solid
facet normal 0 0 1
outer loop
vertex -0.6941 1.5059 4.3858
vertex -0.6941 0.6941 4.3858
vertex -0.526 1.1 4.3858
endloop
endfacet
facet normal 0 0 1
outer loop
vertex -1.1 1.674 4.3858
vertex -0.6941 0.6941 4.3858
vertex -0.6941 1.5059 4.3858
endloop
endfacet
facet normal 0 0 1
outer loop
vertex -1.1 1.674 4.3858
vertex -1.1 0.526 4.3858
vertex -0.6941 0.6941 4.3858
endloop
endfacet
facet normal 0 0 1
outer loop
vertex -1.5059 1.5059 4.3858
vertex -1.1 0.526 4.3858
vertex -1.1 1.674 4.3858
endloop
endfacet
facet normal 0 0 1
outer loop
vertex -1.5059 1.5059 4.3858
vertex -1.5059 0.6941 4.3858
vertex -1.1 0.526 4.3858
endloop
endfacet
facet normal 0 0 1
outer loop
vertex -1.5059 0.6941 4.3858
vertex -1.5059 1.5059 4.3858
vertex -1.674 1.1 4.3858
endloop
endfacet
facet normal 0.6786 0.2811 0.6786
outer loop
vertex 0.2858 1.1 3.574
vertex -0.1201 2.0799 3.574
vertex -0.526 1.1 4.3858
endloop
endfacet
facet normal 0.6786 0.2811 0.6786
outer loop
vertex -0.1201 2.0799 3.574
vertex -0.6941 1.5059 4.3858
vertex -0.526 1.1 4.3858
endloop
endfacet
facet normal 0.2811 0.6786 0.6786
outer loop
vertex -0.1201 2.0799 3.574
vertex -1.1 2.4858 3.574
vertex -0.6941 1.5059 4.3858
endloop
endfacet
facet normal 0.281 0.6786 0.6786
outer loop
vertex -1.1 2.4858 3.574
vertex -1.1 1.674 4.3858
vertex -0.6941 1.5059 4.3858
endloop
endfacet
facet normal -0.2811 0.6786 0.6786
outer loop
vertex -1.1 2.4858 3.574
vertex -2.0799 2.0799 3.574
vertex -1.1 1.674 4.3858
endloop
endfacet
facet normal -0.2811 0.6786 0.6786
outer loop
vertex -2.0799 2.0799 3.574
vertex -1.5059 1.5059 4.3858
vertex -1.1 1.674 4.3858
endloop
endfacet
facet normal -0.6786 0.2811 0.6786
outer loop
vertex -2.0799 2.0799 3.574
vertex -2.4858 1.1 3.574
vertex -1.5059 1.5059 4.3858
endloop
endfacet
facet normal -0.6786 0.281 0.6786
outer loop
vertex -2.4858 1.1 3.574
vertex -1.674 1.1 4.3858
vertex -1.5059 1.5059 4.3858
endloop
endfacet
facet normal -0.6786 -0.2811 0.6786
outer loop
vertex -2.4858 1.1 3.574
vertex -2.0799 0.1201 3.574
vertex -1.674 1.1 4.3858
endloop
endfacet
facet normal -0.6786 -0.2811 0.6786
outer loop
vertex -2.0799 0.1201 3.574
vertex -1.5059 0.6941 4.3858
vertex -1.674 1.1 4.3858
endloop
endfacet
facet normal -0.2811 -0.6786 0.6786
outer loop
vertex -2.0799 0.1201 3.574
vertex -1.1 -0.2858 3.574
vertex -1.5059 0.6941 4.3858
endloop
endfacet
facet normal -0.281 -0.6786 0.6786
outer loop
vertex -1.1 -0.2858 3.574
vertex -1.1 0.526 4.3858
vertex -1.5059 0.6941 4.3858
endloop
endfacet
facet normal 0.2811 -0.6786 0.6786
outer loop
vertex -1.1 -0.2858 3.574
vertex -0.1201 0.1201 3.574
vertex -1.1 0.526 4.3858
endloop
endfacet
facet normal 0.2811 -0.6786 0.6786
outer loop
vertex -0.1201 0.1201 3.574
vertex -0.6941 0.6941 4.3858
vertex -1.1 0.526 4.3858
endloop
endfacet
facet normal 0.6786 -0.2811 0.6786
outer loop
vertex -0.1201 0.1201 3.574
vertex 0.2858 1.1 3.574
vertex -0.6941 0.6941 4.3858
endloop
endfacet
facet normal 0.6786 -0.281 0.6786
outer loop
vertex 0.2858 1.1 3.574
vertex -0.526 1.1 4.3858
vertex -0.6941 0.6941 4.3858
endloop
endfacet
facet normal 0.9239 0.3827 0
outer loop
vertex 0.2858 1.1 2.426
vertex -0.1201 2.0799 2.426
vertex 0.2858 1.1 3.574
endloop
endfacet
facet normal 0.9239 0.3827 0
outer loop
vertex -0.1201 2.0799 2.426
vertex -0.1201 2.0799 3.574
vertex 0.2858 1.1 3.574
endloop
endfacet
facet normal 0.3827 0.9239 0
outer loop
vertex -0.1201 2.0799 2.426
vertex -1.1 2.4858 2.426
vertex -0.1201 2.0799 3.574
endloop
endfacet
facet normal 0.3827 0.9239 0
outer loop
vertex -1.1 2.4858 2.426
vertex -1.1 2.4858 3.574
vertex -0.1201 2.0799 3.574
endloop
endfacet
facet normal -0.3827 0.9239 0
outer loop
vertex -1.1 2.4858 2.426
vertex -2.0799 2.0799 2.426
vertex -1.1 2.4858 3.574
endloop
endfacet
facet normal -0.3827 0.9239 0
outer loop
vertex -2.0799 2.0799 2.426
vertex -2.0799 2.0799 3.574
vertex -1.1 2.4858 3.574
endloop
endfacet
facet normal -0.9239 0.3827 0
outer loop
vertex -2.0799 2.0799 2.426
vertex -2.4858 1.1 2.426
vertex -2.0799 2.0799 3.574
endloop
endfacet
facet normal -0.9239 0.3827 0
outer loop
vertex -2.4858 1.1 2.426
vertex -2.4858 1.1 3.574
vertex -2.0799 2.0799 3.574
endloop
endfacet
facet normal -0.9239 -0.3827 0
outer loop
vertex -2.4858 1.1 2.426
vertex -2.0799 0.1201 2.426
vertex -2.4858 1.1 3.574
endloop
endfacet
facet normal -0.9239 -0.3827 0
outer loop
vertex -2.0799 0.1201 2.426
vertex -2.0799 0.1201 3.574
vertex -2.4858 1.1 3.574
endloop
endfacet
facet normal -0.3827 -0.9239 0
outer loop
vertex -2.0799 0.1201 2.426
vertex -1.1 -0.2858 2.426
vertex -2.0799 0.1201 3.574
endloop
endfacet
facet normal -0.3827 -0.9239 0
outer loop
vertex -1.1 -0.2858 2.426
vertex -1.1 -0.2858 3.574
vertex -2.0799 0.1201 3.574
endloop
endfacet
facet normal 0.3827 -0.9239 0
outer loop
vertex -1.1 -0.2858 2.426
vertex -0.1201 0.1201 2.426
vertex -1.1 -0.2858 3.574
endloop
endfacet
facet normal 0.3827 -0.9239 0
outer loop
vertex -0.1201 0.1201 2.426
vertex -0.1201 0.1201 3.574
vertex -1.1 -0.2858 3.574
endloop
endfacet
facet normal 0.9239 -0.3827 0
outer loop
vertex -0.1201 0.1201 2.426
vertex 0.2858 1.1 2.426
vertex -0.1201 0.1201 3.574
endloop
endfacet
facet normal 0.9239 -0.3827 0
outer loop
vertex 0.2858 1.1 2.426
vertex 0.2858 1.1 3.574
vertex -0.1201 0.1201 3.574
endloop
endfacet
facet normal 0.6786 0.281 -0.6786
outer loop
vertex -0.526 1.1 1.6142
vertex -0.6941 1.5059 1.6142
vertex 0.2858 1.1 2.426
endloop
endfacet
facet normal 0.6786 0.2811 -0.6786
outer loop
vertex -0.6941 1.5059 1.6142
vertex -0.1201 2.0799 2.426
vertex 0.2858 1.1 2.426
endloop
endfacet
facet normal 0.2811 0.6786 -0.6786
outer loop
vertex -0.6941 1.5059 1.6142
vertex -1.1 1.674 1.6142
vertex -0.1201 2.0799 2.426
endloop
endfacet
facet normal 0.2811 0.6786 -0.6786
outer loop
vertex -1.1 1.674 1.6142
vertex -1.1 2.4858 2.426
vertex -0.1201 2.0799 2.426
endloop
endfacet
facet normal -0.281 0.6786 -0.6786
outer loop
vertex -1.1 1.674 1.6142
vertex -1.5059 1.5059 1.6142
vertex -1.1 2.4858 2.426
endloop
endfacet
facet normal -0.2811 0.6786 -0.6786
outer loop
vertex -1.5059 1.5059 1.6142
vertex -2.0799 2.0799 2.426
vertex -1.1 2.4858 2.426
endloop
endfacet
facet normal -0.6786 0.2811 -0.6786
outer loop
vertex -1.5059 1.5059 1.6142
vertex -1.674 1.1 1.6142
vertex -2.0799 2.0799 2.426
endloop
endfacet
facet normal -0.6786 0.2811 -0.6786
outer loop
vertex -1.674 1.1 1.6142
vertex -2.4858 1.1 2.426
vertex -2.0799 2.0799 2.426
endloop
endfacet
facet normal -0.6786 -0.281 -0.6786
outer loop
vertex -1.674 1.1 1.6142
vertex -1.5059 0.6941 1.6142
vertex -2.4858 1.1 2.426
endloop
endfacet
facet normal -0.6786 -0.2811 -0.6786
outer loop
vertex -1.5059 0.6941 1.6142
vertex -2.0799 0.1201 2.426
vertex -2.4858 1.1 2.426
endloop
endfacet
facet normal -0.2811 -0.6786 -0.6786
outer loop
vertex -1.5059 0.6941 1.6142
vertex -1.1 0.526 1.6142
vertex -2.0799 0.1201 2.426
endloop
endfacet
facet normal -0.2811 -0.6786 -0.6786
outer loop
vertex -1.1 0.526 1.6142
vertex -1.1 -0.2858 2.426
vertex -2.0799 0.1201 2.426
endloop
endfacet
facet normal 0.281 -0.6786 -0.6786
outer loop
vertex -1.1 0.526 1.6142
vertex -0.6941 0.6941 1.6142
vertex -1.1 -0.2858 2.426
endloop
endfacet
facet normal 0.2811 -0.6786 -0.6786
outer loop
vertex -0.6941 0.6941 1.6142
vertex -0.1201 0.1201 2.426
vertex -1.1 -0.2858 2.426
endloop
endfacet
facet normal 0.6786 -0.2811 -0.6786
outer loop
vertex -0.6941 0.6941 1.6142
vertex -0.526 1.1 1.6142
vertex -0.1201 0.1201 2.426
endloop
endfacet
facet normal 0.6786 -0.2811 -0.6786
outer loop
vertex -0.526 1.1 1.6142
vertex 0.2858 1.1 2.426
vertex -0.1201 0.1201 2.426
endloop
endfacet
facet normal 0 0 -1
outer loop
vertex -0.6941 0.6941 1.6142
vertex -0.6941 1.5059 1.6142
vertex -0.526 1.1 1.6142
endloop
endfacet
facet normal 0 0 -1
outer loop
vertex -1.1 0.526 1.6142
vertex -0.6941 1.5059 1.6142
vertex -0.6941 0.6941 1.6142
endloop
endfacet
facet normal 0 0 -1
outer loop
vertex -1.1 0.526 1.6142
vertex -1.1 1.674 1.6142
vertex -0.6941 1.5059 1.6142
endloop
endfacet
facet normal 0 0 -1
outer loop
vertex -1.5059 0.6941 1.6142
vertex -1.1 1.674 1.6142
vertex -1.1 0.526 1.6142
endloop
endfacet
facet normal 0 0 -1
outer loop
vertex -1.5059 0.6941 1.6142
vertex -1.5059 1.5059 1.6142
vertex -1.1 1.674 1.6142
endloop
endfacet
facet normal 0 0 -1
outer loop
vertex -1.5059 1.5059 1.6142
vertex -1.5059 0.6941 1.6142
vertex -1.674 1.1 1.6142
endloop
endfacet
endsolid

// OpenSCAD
use <lib.scad>

hd = 72;
ld = 8;

module baseHD() {
	translate([0,0,0.5], $fn=hd) union() {
		rbox([5.8,5.8,1], 0.05, $fn=8);
		translate([0,-1.55,1.4]) difference() {
			rbox([5.2,2,2], 0.025, $fn=8);
			translate([-2.6,0,0]) rotate([0,90,0]) cyl(0.75,0.75,1);
			translate([2.6,0,0]) rotate([0,90,0]) cyl(0.75,0.75,1);
		}
	}
}

module baseLD() {
	translate([0,0,0.5], $fn=ld) union() {
		box([5.8,5.8,1]);
		translate([0,-1.55,1.4]) difference() {
			box([5.2,2,2]);
			translate([-2.6,0,0]) rotate([0,90,0]) cyl(0.75,0.75,1);
			translate([2.6,0,0]) rotate([0,90,0]) cyl(0.75,0.75,1);
		}
	}
}

module baseVLD() {
	translate([0,0,0.5], $fn=ld) union() {
		box([5.8,5.8,1]);
		translate([0,-1.55,1.4]) difference() {
			box([5.2,2,2]);
		}
	}
}

module stackHD() {
	translate([1.6,1.6,4], $fn=hd) union() {
		difference() {
			cyl(0.5, 0.5, 8.0);
			cyl(0.3, 0.3, 8.1);
		}
		translate([0,0,-2.5]) hull() {
			cyl(1.0, 1.0, 3.0);
			translate([0,0,3]) cyl(0.5, 0.5, 0.8);
		}
		for (i = [1:1:4]) translate([0,0,i-0.1]) difference() {
			cyl(0.6, 0.6, 0.1);
			cyl(0.5, 0.5, 0.15);
		}
	}
}

module stackLD() {
	translate([1.6,1.6,4], $fn=ld) union() {
		difference() {
			cyl(0.5, 0.5, 8.0);
			cyl(0.3, 0.3, 8.1);
		}
		translate([0,0,-2.5]) hull() {
			cyl(1.0, 1.0, 3.0);
			translate([0,0,3]) cyl(0.5, 0.5, 0.8);
		}
	}
}

module stackVLD() {
	hull() stackLD();
}

module tankHD() {
	translate([-1.1,1.1,3], $fn=hd) {
		sphere(1.5);
		for (i = [0:45:360]) rotate([0,0,i]) translate([1.4,0,-1]) cyl(0.1,0.1,2);
		for (i = [-1:-0.5:-1.5]) translate([0,0,i]) difference() {
			cyl(1.5,1.5,0.1);
			cyl(1.3,1.3,0.2);
		}
	}
}

module tankLD() {
	translate([-1.1,1.1,3], $fn=ld) {
		sphere(1.5);
		for (i = [0:45:360]) rotate([0,0,i]) translate([1.4,0,-1]) cyl(0.1,0.1,2);
		for (i = [-1:-0.5:-1.5]) translate([0,0,i]) difference() {
			cyl(1.5,1.5,0.1);
			cyl(1.3,1.3,0.2);
		}
	}
}

module tankVLD() {
	translate([-1.1,1.1,3], $fn=ld) {
		sphere(1.5);
	}
}

//baseVLD();
//stackVLD();
tankVLD();
